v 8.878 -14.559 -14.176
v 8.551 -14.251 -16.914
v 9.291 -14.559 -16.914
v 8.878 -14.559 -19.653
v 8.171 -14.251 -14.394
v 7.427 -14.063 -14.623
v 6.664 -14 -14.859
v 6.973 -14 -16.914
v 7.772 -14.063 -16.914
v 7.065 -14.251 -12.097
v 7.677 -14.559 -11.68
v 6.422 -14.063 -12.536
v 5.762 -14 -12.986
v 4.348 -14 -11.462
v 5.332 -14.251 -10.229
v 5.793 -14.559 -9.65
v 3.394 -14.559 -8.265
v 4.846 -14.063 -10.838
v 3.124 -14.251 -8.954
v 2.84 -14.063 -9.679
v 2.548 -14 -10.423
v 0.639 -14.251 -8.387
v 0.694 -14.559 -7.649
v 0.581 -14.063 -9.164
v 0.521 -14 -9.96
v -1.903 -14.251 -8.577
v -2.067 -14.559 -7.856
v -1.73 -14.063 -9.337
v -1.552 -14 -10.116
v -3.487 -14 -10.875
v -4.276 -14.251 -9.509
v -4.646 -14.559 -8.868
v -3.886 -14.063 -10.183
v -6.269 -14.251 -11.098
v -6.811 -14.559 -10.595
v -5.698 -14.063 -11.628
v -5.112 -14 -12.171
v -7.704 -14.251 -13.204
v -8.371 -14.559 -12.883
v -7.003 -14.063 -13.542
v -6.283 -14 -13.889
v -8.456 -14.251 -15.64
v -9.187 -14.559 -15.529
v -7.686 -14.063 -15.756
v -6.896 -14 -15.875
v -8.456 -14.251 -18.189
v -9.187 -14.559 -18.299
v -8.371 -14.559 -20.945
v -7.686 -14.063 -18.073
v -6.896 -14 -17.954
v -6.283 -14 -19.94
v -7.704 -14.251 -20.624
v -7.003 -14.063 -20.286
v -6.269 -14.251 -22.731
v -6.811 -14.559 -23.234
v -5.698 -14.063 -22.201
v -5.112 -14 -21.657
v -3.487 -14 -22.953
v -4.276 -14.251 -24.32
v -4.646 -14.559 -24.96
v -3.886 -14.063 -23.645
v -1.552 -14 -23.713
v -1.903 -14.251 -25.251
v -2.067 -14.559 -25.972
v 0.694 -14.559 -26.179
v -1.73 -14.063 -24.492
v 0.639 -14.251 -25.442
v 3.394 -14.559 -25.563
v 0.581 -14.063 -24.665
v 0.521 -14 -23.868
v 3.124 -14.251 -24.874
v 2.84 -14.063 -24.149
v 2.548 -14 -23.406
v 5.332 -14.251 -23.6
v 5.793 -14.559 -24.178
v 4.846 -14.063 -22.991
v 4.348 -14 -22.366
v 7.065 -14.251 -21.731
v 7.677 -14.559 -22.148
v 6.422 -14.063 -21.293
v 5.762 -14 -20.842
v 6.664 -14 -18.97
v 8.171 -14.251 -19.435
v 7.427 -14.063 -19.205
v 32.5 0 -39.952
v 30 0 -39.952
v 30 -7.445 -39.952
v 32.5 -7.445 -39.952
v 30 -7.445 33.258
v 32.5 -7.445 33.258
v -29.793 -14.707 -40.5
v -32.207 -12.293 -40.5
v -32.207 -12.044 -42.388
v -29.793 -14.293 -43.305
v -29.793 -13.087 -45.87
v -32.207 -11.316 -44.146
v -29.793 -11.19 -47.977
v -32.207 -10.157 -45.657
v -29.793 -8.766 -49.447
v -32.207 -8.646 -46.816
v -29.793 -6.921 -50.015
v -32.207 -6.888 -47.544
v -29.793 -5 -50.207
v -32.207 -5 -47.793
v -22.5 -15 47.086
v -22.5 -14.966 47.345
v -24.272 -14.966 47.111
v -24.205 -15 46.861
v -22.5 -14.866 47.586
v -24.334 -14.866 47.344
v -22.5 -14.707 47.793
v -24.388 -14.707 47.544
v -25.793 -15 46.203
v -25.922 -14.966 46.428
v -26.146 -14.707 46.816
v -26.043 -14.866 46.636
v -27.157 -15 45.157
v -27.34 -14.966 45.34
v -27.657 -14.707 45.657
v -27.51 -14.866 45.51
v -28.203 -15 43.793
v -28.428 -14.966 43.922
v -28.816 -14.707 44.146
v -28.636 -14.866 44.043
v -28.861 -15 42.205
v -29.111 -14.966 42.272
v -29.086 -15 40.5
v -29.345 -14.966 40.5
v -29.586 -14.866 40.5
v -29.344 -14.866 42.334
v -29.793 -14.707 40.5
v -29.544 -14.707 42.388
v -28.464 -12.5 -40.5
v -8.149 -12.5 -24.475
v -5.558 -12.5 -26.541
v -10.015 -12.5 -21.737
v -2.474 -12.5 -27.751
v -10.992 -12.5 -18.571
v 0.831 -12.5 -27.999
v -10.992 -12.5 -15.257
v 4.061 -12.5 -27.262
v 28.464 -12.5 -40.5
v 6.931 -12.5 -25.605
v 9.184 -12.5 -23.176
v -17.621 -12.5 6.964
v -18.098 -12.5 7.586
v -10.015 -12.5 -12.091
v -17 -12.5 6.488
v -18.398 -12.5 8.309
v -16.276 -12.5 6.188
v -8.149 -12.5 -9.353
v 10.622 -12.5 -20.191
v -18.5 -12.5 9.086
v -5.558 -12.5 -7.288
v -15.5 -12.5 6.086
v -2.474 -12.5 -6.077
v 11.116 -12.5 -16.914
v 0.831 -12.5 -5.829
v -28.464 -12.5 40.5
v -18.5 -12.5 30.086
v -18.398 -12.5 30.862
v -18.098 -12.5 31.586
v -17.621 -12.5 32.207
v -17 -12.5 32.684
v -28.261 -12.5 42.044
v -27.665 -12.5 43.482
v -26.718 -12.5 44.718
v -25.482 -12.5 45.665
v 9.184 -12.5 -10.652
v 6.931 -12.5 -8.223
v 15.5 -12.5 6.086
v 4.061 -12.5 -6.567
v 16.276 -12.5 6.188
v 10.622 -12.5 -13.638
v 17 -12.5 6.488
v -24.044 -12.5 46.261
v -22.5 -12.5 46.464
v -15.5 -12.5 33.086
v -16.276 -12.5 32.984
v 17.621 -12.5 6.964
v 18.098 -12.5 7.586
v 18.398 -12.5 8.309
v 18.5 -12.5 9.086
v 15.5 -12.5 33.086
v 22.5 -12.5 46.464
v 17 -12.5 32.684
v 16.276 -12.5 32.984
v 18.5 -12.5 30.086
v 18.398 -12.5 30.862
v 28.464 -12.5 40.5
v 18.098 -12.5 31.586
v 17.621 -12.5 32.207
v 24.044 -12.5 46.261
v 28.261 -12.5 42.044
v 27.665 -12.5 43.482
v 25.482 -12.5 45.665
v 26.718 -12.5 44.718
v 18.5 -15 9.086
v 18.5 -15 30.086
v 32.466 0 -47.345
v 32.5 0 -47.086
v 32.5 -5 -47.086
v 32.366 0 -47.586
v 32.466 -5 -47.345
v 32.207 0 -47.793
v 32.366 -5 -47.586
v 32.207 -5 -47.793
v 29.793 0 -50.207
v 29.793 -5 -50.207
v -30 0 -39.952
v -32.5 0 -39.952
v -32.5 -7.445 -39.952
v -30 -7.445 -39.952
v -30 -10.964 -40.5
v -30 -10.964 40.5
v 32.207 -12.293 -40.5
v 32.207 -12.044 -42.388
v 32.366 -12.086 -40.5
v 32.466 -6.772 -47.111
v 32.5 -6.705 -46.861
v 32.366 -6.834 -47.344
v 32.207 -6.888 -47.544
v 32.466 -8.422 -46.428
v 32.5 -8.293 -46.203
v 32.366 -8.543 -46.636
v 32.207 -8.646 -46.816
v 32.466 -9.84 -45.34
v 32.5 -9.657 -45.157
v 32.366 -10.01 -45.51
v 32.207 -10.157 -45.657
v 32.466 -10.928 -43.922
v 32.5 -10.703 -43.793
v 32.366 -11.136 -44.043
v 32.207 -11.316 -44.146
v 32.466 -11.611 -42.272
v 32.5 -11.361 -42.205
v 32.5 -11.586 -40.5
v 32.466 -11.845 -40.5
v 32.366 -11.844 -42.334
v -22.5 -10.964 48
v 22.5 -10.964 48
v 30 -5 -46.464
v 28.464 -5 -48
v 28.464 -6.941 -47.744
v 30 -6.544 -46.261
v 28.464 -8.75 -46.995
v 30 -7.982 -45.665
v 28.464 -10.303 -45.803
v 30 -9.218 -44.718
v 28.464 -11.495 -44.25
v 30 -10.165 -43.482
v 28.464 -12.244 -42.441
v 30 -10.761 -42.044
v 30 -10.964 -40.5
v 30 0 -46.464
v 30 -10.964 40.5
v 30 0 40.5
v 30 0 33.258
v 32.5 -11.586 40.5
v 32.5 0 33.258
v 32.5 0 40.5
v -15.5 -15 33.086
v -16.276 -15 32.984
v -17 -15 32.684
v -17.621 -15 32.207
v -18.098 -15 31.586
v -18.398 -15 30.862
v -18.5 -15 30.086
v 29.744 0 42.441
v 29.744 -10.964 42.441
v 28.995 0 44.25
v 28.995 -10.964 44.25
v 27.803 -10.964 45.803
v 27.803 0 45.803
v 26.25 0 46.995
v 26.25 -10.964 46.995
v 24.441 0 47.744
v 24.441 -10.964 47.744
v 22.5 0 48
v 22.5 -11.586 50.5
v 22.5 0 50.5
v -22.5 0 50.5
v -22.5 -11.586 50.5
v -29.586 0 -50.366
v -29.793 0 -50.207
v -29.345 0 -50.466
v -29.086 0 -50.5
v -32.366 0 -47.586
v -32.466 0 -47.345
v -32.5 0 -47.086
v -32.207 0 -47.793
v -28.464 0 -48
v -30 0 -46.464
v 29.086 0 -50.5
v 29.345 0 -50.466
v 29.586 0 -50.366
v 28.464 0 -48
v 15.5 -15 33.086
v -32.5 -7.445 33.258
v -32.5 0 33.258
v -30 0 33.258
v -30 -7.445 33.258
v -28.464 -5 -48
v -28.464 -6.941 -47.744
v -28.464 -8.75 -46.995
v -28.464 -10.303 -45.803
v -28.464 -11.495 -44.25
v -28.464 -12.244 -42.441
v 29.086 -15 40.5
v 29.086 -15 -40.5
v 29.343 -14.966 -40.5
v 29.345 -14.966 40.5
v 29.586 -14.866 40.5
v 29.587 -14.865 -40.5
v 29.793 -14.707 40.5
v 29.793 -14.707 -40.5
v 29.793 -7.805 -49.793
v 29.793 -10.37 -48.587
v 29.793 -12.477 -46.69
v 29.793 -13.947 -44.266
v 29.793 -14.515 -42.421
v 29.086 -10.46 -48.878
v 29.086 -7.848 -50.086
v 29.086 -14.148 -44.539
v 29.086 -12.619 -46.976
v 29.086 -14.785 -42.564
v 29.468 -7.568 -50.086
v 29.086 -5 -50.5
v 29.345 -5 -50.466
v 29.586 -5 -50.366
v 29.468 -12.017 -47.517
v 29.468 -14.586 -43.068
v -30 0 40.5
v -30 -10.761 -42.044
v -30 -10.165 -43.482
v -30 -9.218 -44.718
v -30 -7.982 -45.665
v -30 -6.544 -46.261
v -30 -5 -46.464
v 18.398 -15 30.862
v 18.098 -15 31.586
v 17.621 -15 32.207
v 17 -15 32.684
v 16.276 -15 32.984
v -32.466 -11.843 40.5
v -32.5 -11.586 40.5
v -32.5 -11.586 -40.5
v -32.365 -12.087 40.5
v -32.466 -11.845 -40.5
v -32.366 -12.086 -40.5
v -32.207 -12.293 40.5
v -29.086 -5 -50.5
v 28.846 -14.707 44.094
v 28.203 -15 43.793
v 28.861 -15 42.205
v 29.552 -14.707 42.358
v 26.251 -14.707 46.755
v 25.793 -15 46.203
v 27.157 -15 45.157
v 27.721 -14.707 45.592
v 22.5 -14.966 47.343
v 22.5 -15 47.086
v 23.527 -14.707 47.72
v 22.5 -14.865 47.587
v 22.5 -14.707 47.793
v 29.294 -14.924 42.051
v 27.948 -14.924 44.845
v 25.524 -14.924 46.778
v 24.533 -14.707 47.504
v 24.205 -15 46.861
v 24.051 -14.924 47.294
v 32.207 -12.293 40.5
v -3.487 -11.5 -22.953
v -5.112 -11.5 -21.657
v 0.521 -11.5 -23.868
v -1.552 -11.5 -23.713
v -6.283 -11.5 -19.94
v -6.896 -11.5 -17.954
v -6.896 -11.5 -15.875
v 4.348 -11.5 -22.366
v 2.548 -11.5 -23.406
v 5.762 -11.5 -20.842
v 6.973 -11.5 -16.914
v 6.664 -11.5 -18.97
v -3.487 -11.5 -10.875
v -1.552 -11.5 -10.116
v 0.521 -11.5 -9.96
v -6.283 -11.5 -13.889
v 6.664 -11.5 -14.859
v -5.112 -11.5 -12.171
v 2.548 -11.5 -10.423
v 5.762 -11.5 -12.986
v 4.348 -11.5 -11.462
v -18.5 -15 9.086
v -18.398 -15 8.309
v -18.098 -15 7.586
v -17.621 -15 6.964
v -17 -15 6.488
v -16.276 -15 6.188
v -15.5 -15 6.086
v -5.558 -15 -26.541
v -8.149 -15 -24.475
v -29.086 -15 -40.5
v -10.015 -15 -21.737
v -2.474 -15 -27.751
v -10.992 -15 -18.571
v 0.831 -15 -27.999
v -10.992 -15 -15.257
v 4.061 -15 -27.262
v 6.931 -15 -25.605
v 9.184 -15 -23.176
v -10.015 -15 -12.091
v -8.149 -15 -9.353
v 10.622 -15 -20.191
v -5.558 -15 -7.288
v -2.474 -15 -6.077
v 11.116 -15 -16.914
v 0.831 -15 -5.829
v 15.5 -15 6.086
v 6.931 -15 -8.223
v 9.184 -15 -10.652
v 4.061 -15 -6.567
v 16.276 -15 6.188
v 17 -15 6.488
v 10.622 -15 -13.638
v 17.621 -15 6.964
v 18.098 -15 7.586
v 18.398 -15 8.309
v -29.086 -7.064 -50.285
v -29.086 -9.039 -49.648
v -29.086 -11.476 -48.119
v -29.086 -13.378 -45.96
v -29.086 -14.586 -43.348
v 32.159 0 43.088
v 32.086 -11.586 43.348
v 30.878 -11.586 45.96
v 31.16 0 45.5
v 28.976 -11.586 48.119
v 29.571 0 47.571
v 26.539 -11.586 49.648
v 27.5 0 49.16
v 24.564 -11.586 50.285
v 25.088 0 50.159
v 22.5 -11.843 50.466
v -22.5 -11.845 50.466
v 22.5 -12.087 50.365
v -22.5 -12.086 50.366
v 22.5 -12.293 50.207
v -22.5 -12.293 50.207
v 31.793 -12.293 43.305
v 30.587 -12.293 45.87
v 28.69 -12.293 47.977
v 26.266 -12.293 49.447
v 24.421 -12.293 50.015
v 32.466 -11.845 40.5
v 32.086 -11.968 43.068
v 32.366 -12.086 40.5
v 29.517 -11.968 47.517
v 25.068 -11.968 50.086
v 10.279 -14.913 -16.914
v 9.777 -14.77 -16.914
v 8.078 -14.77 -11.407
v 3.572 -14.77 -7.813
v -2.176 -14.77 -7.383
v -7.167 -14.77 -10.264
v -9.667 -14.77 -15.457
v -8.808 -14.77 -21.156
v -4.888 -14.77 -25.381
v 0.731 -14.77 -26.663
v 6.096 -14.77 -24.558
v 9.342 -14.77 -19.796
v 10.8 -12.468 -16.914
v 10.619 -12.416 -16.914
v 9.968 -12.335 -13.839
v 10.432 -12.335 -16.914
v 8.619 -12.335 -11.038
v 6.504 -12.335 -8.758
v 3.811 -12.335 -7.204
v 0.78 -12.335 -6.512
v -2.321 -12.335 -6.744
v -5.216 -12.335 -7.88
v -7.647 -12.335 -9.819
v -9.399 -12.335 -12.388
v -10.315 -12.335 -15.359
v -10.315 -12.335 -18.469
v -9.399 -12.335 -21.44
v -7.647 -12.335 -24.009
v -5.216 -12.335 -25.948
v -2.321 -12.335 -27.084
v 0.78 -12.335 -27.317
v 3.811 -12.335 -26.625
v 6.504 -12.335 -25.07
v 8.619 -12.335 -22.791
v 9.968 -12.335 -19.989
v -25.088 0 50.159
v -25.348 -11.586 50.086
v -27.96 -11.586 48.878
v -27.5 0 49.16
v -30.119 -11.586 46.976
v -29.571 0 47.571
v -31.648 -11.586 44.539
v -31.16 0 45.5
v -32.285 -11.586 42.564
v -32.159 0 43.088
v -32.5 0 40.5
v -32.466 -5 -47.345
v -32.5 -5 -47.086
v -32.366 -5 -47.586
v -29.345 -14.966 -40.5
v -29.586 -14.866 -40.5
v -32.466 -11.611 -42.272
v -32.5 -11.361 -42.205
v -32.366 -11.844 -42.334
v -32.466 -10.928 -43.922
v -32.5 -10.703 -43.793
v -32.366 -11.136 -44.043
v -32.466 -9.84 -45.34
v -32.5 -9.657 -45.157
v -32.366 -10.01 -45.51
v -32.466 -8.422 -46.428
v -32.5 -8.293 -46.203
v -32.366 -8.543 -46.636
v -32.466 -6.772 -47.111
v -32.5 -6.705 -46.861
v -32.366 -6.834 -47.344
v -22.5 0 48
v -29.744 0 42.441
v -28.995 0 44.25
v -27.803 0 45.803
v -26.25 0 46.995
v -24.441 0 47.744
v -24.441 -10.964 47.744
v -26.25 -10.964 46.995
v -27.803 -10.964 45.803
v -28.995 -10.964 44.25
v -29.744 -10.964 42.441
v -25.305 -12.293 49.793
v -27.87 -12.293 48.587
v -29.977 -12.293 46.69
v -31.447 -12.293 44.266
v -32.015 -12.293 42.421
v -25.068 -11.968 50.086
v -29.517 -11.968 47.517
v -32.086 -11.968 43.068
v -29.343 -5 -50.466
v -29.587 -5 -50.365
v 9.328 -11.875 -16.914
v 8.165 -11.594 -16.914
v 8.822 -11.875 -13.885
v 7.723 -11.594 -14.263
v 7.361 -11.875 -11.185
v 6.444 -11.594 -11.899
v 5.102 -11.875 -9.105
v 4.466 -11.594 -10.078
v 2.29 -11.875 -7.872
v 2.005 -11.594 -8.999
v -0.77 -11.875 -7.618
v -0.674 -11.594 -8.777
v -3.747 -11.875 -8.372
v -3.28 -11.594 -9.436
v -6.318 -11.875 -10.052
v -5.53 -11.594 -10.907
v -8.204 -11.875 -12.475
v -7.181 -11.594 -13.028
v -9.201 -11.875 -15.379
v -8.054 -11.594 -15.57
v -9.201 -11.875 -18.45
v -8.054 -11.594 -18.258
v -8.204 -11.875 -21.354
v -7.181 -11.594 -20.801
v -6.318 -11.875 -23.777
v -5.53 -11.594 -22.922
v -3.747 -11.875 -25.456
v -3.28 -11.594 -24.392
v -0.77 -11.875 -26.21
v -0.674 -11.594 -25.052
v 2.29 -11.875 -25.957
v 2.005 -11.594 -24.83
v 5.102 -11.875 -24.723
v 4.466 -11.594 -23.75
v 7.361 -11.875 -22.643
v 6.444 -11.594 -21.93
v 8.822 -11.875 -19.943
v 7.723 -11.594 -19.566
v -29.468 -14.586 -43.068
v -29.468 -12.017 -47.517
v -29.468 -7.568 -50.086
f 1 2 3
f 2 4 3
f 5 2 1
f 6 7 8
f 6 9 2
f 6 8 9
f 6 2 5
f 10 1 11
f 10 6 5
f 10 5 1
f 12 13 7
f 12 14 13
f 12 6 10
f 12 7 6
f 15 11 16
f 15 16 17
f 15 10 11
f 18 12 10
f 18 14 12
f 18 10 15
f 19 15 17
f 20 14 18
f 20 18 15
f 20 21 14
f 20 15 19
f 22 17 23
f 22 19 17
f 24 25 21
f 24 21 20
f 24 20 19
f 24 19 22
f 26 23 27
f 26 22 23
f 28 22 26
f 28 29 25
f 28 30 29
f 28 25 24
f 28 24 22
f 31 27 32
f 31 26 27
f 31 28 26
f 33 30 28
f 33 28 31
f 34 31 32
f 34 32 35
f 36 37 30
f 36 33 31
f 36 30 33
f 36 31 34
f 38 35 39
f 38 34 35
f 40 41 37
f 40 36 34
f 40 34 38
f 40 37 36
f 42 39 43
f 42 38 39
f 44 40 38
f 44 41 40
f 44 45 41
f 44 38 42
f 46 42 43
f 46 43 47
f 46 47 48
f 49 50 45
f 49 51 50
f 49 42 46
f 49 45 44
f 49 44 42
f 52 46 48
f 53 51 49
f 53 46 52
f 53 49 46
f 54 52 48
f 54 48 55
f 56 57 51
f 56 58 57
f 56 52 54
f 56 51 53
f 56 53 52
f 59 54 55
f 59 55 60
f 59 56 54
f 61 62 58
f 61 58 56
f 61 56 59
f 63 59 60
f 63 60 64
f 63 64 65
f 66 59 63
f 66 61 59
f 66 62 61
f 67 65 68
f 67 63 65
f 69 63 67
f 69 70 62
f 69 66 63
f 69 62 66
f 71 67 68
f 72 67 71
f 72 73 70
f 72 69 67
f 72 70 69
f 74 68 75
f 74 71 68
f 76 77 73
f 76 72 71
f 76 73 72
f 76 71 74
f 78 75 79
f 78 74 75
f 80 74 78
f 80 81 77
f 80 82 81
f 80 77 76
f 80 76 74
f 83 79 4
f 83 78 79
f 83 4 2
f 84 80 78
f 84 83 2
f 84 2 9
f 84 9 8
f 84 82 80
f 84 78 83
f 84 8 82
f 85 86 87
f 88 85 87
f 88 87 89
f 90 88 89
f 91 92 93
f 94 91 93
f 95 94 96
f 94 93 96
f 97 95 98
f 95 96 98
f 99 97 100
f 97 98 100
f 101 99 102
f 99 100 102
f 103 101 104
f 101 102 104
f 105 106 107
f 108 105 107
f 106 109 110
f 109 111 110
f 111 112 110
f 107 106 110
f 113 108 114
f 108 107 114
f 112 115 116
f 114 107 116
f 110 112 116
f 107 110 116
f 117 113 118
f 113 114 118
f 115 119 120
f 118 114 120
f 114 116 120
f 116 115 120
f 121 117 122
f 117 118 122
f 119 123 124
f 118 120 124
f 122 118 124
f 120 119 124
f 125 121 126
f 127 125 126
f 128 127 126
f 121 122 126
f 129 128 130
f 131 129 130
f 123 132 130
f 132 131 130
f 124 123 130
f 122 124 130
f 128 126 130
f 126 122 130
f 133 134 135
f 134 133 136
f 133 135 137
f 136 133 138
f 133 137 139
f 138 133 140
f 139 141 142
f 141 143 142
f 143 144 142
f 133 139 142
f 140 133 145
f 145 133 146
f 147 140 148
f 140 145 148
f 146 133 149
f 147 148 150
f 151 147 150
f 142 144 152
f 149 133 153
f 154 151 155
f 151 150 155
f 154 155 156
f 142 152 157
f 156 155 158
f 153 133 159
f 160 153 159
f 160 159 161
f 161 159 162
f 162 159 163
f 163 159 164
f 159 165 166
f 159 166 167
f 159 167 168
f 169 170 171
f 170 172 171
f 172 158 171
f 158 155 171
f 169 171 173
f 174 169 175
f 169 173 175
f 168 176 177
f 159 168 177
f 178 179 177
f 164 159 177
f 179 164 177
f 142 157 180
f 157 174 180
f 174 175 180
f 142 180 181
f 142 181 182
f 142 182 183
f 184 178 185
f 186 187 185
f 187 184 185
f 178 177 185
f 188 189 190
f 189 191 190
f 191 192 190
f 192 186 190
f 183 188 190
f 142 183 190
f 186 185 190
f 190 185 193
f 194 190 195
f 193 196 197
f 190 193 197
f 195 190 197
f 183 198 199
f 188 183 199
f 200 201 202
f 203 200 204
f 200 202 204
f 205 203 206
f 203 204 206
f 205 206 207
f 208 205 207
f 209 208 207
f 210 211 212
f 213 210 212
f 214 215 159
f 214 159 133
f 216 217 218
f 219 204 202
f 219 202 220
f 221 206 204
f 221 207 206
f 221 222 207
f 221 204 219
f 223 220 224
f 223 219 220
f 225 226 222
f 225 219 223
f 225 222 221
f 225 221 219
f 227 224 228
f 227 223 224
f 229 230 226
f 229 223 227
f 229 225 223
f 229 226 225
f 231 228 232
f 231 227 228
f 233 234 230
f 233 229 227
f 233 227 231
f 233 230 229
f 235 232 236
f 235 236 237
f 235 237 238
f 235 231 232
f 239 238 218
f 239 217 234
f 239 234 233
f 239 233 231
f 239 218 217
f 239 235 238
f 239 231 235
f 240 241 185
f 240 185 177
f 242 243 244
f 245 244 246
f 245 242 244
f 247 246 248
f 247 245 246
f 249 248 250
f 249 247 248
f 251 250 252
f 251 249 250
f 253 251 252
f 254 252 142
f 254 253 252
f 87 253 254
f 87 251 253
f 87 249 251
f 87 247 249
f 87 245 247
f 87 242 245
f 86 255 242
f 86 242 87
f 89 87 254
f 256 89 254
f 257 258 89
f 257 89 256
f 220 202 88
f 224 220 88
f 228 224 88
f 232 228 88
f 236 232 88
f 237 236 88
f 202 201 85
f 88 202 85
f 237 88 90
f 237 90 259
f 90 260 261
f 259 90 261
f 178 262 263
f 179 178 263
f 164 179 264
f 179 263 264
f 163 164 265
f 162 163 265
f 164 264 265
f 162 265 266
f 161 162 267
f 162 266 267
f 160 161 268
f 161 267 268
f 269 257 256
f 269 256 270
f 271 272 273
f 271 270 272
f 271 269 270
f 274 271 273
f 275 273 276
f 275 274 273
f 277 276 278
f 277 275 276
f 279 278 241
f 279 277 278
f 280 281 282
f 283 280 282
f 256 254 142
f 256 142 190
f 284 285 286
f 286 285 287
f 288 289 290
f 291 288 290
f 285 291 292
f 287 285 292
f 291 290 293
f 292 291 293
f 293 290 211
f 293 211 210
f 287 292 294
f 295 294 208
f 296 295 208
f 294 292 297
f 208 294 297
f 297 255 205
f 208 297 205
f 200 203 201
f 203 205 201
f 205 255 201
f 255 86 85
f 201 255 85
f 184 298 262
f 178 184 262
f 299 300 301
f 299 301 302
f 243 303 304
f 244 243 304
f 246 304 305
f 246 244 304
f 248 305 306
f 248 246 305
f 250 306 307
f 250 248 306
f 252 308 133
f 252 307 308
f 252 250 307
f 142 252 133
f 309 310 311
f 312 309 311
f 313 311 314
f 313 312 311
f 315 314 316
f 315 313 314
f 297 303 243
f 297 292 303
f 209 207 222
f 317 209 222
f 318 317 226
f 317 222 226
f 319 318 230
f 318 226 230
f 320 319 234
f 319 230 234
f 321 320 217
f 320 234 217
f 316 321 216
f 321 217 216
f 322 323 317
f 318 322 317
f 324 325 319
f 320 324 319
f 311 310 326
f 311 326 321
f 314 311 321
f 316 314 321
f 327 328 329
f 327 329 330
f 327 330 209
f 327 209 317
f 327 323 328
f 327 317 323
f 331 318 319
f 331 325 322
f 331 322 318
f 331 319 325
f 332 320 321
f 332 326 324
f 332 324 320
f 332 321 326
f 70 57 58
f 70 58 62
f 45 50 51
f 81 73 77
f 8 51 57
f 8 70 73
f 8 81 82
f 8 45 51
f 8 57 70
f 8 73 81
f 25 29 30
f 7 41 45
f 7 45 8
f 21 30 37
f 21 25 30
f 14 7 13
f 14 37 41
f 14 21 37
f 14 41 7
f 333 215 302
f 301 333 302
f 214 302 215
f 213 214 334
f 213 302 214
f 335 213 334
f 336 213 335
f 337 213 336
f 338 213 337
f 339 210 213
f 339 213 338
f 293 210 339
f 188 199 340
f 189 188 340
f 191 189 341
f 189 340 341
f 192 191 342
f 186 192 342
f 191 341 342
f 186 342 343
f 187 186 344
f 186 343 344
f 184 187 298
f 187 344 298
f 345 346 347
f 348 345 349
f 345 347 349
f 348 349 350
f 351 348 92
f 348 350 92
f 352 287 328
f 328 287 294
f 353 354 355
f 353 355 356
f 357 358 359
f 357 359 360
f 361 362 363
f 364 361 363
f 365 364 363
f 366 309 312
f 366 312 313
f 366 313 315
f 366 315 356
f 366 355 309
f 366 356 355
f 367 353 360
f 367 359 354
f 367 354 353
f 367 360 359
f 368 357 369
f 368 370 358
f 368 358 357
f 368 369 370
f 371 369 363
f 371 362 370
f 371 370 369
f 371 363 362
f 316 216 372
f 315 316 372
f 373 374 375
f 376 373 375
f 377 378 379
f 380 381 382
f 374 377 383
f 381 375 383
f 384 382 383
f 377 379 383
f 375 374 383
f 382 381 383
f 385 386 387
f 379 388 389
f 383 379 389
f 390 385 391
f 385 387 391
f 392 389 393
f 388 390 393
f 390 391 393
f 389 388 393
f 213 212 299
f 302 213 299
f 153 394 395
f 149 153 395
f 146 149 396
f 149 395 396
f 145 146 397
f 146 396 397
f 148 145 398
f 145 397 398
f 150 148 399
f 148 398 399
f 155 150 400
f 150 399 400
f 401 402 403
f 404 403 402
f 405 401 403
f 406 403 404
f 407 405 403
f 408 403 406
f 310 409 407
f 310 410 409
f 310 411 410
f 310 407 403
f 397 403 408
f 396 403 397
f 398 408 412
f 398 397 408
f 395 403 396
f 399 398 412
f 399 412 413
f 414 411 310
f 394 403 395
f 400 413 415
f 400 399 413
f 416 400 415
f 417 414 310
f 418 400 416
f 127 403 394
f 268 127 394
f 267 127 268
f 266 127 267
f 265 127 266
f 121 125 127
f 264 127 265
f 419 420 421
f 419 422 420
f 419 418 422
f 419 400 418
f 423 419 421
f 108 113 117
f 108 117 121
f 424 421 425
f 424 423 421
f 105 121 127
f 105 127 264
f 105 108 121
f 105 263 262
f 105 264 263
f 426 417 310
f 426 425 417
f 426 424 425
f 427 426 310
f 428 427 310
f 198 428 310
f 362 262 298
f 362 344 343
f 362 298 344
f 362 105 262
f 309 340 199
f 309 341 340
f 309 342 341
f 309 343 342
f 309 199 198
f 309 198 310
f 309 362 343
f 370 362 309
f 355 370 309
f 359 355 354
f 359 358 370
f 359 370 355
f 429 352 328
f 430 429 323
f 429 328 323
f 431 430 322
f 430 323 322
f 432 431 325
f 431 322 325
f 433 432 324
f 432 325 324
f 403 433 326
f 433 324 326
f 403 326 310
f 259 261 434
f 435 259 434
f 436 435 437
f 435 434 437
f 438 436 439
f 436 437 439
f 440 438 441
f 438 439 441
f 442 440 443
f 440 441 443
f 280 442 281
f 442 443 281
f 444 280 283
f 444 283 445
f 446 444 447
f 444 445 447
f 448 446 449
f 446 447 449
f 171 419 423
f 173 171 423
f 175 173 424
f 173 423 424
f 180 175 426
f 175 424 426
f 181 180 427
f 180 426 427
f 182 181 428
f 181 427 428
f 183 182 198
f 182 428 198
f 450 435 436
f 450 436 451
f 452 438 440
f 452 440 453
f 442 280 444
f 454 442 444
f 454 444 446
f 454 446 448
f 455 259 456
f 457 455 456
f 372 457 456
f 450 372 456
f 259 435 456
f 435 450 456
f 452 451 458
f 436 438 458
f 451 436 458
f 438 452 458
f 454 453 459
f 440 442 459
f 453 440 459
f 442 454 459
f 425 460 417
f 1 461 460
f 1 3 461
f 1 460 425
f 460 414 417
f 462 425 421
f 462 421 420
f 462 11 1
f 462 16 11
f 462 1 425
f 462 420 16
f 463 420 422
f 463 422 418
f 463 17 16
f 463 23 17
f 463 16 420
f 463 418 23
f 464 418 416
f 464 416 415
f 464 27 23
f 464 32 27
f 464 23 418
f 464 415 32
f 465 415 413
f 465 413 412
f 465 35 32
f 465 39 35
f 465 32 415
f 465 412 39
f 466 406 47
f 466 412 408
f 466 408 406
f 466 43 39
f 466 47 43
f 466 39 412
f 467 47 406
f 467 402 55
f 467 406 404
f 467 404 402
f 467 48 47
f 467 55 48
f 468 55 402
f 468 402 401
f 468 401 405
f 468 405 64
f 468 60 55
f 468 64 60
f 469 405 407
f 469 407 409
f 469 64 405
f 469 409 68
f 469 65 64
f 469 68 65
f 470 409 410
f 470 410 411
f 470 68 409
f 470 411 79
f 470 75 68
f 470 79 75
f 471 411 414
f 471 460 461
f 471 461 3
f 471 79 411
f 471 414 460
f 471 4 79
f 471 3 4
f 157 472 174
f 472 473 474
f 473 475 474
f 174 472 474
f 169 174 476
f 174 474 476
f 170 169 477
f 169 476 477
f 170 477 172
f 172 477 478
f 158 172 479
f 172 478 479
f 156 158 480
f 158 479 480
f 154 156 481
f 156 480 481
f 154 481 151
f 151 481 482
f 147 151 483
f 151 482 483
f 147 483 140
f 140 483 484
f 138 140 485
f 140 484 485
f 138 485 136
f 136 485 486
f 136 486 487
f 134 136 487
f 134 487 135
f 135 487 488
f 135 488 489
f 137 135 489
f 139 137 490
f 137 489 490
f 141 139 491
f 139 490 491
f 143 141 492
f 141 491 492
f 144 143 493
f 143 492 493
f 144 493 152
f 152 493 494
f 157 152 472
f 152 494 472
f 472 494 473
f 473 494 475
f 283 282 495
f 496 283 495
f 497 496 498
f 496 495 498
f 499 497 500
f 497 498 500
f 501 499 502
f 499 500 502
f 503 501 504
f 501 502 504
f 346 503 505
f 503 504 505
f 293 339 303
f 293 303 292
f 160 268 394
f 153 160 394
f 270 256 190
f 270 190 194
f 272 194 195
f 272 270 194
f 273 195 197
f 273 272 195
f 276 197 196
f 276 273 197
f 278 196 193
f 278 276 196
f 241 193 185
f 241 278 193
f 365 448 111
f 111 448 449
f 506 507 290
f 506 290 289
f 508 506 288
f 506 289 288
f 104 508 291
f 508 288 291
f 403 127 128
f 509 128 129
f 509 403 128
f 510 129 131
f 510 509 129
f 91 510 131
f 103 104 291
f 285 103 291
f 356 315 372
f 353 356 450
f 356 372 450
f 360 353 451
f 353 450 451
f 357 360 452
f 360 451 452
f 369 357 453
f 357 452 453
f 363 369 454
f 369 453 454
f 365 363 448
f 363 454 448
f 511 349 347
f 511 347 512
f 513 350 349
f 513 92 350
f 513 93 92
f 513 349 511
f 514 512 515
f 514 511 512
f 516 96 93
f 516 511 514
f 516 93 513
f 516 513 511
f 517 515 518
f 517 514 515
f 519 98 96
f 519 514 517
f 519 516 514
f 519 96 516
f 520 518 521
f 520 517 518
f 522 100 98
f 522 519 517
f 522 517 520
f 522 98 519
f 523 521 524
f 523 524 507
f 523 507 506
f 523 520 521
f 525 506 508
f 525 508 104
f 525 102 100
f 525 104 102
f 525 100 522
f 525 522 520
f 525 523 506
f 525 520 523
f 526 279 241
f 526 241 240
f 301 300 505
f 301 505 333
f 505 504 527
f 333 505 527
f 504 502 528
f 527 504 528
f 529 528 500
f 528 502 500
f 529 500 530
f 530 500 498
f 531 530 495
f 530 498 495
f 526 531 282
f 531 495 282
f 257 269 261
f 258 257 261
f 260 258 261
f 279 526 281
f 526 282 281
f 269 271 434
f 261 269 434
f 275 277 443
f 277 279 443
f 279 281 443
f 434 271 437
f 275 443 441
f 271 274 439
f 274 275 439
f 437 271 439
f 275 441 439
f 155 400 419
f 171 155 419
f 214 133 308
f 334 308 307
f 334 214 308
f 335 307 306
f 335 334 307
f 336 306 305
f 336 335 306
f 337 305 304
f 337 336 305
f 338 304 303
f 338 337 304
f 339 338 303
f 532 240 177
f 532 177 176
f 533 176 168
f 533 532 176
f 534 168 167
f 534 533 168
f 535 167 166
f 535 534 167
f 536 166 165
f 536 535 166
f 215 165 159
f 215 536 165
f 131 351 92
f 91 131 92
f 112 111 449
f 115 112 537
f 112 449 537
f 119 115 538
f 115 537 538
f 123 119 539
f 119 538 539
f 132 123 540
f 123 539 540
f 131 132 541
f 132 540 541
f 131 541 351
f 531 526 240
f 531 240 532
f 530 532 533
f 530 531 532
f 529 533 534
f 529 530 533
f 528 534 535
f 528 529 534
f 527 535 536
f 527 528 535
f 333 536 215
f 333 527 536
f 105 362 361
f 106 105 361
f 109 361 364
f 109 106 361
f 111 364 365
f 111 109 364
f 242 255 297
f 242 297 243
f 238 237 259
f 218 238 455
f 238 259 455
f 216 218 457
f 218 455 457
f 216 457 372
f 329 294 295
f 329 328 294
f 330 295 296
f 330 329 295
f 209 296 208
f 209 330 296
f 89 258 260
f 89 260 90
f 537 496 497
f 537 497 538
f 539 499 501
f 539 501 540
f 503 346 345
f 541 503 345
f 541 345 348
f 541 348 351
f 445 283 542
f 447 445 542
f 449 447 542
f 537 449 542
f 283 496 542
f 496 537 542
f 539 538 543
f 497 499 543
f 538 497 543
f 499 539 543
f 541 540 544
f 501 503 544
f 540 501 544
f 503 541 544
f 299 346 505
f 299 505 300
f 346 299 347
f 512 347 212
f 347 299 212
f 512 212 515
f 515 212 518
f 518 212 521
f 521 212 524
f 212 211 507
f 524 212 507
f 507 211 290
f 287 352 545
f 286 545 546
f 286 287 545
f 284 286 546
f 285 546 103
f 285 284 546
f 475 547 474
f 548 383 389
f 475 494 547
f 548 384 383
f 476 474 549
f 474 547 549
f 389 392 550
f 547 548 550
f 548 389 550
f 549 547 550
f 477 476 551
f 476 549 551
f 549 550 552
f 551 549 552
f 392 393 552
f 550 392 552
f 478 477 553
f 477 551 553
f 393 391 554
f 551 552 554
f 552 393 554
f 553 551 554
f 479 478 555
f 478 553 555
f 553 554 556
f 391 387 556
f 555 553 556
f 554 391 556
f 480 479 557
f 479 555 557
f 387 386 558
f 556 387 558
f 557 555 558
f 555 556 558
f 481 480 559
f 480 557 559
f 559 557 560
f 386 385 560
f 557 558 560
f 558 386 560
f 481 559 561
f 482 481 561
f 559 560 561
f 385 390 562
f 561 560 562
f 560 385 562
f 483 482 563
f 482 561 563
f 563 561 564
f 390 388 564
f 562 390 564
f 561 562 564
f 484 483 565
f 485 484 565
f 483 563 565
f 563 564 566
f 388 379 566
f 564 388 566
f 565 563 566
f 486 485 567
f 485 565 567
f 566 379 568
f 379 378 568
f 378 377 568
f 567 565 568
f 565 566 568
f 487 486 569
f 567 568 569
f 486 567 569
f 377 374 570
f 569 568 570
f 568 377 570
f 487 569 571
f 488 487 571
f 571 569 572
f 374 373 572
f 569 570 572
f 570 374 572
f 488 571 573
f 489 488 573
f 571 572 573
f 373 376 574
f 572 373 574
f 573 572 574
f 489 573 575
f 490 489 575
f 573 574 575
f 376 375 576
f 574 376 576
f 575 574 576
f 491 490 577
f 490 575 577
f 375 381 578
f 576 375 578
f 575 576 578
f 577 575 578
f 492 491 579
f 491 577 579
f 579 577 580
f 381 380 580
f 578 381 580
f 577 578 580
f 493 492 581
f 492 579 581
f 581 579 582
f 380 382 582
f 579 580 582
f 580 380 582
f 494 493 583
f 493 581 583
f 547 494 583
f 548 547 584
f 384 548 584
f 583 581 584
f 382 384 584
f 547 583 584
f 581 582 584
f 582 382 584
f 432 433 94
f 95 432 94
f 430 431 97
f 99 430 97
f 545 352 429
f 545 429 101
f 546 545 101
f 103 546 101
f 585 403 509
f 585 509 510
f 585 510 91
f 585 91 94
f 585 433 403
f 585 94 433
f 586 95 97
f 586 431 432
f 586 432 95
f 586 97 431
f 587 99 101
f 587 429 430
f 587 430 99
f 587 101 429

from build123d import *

# Parameters (mm, degrees)
F1_DEPTH  = 15
F2_R      = 10
F3_SIZE   = 3
F4_R      = 1
F6_DEPTH  = 25.4
F7_R      = 10
F8_DEPTH  = 1
F11_T     = -2.5
F12_W     = 7.4454136193
F12_H     = 73.2100643218
F3_FACE_W = 3.4142135624
F3_FACE_H = 81
F13_DEPTH = 81.8


# Not quite as in the source:
# - a fillet or chamfer that OpenCascade refuses, or shapes differently, is made with other operations: its cross-section is extruded or revolved along the edge and cut away or added


with BuildPart() as f1:
    # F0 (on Front) → F1 (new body)
    with BuildSketch(Plane.XZ):
        with BuildLine():
            Line((22.5, 50.5), (-22.5, 50.5))
            ThreePointArc((-22.5, 50.5), (-29.5710678119, 47.5710678119), (-32.5, 40.5))
            Line((-32.5, 40.5), (-32.5, -50.5))
            Line((-32.5, -50.5), (32.5, -50.5))
            Line((32.5, -50.5), (32.5, 40.5))
            ThreePointArc((32.5, 40.5), (29.5710678119, 47.5710678119), (22.5, 50.5))
        make_face()
    extrude(amount=F1_DEPTH)

    # F2
    f2_edges = [f1.edges().sort_by_distance(p)[0] for p in [
        (0, -15, -50.5),
    ]]
    fillet(f2_edges, radius=F2_R)

    # F3
    f3_edges = [f1.edges().sort_by_distance(p)[0] for p in [
        (32.5, -15, 0),
        (-32.5, -2.5, -50.5),
        (-32.5, -12.071068, -47.571068),
        (-32.5, -15, 0),
        (32.5, -2.5, -50.5),
        (32.5, -12.071068, -47.571068),
        (-29.571068, -15, 47.571068),
        (0, -15, 50.5),
        (29.571068, -15, 47.571068),
    ]]
    chamfer(f3_edges, length=F3_SIZE)

    # F4
    f4_edges = [f1.edges().sort_by_distance(p)[0] for p in [
        (32.5, -12, 0),
        (-32.5, -12, 0),
        (29.5, -15, 0),
        (-32.5, -2.5, -47.5),
        (-32.5, -9.949747, -45.449747),
        (-29.5, -2.5, -50.5),
        (-29.571068, -12, 47.571068),
        (-29.5, -12.071068, -47.571068),
        (-29.5, -15, 0),
        (29.5, -2.5, -50.5),
        (0, -12, 50.5),
        (32.5, -2.5, -47.5),
        (29.571068, -12, 47.571068),
        (32.5, -9.949747, -45.449747),
        (-27.449747, -15, 45.449747),
        (29.5, -12.071068, -47.571068),
        (27.449747, -15, 45.449747),
        (0, -15, 47.5),
    ]]
    fillet(f4_edges, radius=F4_R)

    # F5 (on face) → F6 (cut)
    with BuildSketch(Plane.XZ.offset(15)):
        with BuildLine():
            Line((15.5, 33.0857864376), (-15.5, 33.0857864376))
            ThreePointArc((-15.5, 33.0857864376), (-17.6213203436, 32.2071067812), (-18.5, 30.0857864376))
            Line((-18.5, 30.0857864376), (-18.5, 9.0857864376))
            ThreePointArc((-18.5, 9.0857864376), (-17.6213203436, 6.9644660941), (-15.5, 6.0857864376))
            Line((-15.5, 6.0857864376), (15.5, 6.0857864376))
            ThreePointArc((15.5, 6.0857864376), (17.6213203436, 6.9644660941), (18.5, 9.0857864376))
            Line((18.5, 9.0857864376), (18.5, 30.0857864376))
            ThreePointArc((18.5, 30.0857864376), (17.6213203436, 32.2071067812), (15.5, 33.0857864376))
        make_face()
    extrude(amount=-F6_DEPTH, mode=Mode.SUBTRACT)

    # F7 (on face) → F8 (cut)
    with BuildSketch(Plane.XZ.offset(15)):
        with Locations((0, -16.9142135624)):
            Circle(F7_R)
    extrude(amount=-F8_DEPTH, mode=Mode.SUBTRACT)

    # F9: fillet of radius 5.08 on 1 edges, made by hand

    # F9_s1 → F9_t2 (revolve)
    with BuildSketch(Plane.XY.offset(-16.9142135624)):
        with BuildLine():
            ThreePointArc((10, -15), (8.567188555, -14.2564743185), (6.9734508099, -14))
            Line((6.9734508099, -14), (10, -14))
            Line((10, -14), (10, -15))
        make_face()
    revolve(axis=Axis((0, -14, -16.9142135624), (0, -1, 0)))

    # F10: fillet of radius 4 on 1 edges, made by hand

    # F10_s1 → F10_t2 (revolve, cut)
    with BuildSketch(Plane.XY.offset(-16.9142135624)):
        with BuildLine():
            add(Edge.make_bspline(
                [(11.1159138454, -15), (10.1503047462, -15), (9.2910402615, -14.5594713656)],
                knots=[0, 0, 0, 1, 1, 1], degree=2, weights=[1, 1, 1]))
            ThreePointArc((9.2910402615, -14.5594713656), (9.6545831872, -14.7651501561), (10, -15))
            Line((10, -15), (11.1159138454, -15))
        make_face()
    revolve(axis=Axis((0, -15, -16.9142135624), (0, -1, 0)), mode=Mode.SUBTRACT)

    # F11
    f11_openings = [f1.faces().sort_by_distance(p)[0] for p in [
        (18.5, -7.5, 19.585786),
        (17.62132, -7.5, 32.207107),
        (0, -7.5, 33.085786),
        (-17.62132, -7.5, 32.207107),
        (-18.5, -7.5, 19.585786),
        (-17.62132, -7.5, 6.964466),
        (0, -7.5, 6.085786),
        (17.62132, -7.5, 6.964466),
        (0, 0, -3.809825),
    ]]
    offset(amount=F11_T, openings=f11_openings)

    # F12 (on face) + F3_face (on face) → F13 (cut)
    with BuildSketch(Plane(origin=(-32.5, 0, 0), x_dir=(0, -1, 0), z_dir=(-1, 0, 0))):
        with Locations((3.7227068096, -3.3467467874)):
            Rectangle(F12_W, F12_H)
    with BuildSketch(Plane(origin=(31, -13.5, 0), x_dir=(0.7071067812, 0.7071067812, 0), z_dir=(0.7071067812, -0.7071067812, 0))):
        Rectangle(F3_FACE_W, F3_FACE_H)
    extrude(amount=-F13_DEPTH, dir=(-1, 0, 0), mode=Mode.SUBTRACT)


solid = f1.part
